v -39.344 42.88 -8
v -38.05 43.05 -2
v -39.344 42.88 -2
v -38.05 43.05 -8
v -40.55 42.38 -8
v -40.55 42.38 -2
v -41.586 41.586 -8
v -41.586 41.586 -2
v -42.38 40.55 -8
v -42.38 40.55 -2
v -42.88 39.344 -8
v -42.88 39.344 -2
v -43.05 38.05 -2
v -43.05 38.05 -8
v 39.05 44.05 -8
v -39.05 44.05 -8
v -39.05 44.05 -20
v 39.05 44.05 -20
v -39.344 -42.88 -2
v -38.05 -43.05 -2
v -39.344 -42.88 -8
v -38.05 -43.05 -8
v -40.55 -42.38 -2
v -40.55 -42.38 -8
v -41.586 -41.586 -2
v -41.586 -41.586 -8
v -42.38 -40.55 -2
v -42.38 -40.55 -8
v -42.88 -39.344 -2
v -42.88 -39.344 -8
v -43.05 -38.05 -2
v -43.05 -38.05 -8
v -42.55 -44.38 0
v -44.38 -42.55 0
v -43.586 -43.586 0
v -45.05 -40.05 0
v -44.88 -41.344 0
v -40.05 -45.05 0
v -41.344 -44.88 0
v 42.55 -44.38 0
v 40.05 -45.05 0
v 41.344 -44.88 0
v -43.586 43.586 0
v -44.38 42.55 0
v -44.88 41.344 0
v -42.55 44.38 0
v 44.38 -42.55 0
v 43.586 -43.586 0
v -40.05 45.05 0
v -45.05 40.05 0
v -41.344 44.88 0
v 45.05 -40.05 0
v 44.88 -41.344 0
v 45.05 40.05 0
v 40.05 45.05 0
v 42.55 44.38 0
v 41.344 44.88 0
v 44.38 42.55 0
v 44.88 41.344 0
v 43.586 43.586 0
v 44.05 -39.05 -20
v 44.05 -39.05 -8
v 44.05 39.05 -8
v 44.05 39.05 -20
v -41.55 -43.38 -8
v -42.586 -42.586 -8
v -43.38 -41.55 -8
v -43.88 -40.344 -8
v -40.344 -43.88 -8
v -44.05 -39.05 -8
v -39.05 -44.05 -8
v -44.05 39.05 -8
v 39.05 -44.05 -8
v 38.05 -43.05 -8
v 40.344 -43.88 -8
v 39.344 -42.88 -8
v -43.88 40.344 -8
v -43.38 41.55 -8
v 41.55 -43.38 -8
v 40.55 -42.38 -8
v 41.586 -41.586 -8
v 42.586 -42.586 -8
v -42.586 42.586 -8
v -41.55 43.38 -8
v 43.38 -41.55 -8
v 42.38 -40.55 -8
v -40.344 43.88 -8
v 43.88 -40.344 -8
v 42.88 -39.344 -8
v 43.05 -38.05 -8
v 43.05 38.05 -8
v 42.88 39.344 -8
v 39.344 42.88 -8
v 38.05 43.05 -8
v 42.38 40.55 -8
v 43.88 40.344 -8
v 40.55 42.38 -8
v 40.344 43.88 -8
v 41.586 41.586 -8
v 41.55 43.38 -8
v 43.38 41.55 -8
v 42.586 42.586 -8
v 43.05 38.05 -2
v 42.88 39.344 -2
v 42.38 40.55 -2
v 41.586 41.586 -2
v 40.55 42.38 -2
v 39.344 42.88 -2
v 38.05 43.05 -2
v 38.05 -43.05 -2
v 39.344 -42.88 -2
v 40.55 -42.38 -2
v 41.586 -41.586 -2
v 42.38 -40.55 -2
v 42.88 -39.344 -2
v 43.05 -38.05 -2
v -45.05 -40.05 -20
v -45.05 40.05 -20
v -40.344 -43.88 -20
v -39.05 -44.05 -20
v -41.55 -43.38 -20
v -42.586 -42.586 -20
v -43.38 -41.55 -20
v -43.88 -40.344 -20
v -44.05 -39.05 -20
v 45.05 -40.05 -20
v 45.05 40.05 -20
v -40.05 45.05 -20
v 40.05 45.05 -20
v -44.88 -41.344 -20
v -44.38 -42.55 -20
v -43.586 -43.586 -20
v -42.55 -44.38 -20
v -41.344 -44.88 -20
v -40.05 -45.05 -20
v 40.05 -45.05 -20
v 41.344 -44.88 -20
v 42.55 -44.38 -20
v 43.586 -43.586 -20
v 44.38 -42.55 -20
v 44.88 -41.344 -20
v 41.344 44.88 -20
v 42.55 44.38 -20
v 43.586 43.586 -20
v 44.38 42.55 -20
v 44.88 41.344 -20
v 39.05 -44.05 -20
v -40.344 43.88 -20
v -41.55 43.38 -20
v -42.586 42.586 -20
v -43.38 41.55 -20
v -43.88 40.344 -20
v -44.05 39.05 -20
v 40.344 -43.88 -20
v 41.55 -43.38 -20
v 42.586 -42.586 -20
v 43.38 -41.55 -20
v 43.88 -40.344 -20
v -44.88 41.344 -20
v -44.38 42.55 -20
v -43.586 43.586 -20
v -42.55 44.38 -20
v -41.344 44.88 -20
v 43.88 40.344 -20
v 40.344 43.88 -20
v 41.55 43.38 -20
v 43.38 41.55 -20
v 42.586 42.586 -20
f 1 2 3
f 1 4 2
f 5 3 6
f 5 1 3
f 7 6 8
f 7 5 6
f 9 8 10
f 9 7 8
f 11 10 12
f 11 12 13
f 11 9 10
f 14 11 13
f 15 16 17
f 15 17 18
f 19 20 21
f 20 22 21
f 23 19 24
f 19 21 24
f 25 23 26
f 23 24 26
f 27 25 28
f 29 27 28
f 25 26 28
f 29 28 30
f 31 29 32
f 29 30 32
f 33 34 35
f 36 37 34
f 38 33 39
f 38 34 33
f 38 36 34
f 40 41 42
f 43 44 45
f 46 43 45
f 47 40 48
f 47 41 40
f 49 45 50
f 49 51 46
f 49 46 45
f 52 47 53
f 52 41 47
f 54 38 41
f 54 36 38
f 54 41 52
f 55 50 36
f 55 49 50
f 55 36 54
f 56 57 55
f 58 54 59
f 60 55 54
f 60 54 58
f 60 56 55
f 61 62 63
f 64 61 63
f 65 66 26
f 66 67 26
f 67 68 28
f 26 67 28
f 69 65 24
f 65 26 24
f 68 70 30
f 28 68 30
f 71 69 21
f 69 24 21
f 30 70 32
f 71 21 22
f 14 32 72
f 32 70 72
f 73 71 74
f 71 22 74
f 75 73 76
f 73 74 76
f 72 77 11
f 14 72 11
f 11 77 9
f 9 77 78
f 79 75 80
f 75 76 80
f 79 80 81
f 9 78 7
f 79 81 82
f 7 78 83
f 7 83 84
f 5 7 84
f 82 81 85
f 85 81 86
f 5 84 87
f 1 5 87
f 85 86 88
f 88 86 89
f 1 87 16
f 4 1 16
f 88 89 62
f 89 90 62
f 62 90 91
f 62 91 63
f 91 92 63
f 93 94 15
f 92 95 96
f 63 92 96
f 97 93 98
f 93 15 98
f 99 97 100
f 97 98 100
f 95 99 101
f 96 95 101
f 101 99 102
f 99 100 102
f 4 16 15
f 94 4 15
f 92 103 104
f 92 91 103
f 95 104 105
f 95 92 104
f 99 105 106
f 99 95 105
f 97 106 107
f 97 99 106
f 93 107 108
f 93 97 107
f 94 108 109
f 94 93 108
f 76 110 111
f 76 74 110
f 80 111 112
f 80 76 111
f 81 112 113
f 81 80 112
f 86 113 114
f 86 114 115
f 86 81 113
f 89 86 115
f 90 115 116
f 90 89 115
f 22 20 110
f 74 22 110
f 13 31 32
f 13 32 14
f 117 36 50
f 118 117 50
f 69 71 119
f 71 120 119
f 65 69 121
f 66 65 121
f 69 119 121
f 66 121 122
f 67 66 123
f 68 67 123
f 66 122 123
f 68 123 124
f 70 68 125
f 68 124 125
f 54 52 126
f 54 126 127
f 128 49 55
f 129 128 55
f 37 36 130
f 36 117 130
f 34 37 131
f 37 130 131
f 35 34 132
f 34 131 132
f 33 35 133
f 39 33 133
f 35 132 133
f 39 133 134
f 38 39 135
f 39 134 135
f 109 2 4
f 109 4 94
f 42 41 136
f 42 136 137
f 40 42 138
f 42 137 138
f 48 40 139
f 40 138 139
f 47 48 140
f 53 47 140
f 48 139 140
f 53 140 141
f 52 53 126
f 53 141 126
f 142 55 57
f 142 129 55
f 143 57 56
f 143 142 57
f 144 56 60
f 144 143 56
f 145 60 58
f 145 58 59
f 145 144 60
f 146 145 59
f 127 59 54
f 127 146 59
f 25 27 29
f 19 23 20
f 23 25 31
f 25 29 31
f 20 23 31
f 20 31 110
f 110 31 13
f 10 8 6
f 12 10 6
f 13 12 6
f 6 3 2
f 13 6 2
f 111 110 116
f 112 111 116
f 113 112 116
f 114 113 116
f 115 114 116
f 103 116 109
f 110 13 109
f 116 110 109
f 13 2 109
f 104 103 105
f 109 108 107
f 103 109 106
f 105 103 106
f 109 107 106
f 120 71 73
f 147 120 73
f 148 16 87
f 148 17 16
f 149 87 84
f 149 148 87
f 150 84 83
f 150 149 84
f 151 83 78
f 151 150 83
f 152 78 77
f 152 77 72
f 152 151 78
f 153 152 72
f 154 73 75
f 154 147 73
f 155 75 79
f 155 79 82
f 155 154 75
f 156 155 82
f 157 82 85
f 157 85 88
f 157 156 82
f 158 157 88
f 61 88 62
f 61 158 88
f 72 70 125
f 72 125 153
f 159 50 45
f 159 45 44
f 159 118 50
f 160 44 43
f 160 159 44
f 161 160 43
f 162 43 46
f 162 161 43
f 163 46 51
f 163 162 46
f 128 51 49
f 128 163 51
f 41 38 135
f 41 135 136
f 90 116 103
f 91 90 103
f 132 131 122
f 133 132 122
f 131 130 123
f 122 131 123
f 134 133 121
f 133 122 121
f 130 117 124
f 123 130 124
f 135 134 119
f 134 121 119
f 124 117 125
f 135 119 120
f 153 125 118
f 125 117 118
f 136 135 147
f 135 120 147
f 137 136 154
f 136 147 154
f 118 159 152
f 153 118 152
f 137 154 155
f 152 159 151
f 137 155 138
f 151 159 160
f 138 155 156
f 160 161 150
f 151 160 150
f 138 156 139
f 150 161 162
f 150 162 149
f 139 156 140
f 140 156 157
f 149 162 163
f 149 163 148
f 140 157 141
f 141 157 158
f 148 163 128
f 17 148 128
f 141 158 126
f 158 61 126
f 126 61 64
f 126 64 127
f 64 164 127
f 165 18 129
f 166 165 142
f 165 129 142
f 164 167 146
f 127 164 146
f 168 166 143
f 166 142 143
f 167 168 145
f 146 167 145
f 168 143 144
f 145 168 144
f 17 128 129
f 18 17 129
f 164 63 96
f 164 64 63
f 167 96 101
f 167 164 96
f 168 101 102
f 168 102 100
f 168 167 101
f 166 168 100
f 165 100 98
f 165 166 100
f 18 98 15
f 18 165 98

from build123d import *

# Parameters (mm, degrees)
F0_W     = 86.1
F0_H     = 86.1
F1_DEPTH = 2
F0_W_2   = 88.1
F0_H_2   = 88.1
F2_DEPTH = 8
F0_W_3   = 90.1
F0_H_3   = 90.1
F3_DEPTH = 20
F4_R     = 5


with BuildPart() as f1:
    # F0 (on Top) → F1 (new body)
    with BuildSketch(Plane.XY):
        Rectangle(F0_W, F0_H)
    extrude(amount=-F1_DEPTH)

    # F0 (on Top) → F2 (join)
    with BuildSketch(Plane.XY):
        Rectangle(F0_W_2, F0_H_2)
        Rectangle(F0_W, F0_H, mode=Mode.SUBTRACT)
    extrude(amount=-F2_DEPTH)

    # F0 (on Top) → F3 (join)
    with BuildSketch(Plane.XY):
        Rectangle(F0_W_3, F0_H_3)
        Rectangle(F0_W_2, F0_H_2, mode=Mode.SUBTRACT)
    extrude(amount=-F3_DEPTH)

    # F4
    f4_edges = [f1.edges().sort_by_distance(p)[0] for p in [
        (-43.05, -43.05, -5),
        (-44.05, -44.05, -14),
        (43.05, -43.05, -5),
        (44.05, -44.05, -14),
        (43.05, 43.05, -5),
        (44.05, 44.05, -14),
        (-43.05, 43.05, -5),
        (-44.05, 44.05, -14),
        (45.05, -45.05, -10),
        (45.05, 45.05, -10),
        (-45.05, -45.05, -10),
        (-45.05, 45.05, -10),
    ]]
    fillet(f4_edges, radius=F4_R)


solid = f1.part
